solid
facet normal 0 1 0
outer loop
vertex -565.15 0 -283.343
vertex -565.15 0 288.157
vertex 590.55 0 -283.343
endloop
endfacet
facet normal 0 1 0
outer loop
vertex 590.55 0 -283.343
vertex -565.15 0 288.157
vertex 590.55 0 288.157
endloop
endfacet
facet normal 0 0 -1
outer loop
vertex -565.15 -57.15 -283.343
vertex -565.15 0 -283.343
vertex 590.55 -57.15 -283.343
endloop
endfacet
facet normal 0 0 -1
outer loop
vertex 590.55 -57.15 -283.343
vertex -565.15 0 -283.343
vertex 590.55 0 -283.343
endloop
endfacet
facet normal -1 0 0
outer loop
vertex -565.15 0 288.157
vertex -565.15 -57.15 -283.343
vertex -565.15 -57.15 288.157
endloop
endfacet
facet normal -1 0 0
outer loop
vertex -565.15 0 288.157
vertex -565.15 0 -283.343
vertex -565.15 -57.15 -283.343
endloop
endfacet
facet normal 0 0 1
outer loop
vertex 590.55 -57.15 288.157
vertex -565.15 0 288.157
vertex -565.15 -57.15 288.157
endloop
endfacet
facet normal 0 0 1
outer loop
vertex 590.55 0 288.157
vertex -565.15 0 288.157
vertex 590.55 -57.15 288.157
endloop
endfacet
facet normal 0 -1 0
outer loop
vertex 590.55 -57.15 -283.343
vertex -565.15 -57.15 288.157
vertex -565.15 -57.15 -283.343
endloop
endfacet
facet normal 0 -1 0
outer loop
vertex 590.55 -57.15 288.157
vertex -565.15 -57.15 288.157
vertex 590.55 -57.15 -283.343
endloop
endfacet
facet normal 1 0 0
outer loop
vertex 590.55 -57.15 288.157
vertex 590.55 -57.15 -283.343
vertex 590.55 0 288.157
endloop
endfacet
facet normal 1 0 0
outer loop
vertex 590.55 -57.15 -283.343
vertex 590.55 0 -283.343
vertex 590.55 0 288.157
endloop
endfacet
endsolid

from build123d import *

# Parameters (mm, degrees)
F0_W     = 1181.1
F0_H     = 571.5
F1_DEPTH = 50.8
F2_DEPTH = 25.4
F3_DEPTH = 6.35


with BuildPart() as f1:
    # F0 (on Front) → F1 (new body)
    with BuildSketch(Plane.XZ):
        with Locations((0, 2.4073491804)):
            Rectangle(F0_W, F0_H)
    extrude(amount=F1_DEPTH)

    # F2 (cut): a face of the model
    f2_faces = [f1.faces().sort_by_distance(p)[0] for p in [
        (-590.55, -25.4, 2.4073491804),
    ]]
    extrude(f2_faces, amount=-F2_DEPTH, mode=Mode.SUBTRACT)

    # F3 (add): a face of the model
    f3_faces = [f1.faces().sort_by_distance(p)[0] for p in [
        (12.7, -50.8, 2.4073491804),
    ]]
    extrude(f3_faces, amount=F3_DEPTH)


solid = f1.part
